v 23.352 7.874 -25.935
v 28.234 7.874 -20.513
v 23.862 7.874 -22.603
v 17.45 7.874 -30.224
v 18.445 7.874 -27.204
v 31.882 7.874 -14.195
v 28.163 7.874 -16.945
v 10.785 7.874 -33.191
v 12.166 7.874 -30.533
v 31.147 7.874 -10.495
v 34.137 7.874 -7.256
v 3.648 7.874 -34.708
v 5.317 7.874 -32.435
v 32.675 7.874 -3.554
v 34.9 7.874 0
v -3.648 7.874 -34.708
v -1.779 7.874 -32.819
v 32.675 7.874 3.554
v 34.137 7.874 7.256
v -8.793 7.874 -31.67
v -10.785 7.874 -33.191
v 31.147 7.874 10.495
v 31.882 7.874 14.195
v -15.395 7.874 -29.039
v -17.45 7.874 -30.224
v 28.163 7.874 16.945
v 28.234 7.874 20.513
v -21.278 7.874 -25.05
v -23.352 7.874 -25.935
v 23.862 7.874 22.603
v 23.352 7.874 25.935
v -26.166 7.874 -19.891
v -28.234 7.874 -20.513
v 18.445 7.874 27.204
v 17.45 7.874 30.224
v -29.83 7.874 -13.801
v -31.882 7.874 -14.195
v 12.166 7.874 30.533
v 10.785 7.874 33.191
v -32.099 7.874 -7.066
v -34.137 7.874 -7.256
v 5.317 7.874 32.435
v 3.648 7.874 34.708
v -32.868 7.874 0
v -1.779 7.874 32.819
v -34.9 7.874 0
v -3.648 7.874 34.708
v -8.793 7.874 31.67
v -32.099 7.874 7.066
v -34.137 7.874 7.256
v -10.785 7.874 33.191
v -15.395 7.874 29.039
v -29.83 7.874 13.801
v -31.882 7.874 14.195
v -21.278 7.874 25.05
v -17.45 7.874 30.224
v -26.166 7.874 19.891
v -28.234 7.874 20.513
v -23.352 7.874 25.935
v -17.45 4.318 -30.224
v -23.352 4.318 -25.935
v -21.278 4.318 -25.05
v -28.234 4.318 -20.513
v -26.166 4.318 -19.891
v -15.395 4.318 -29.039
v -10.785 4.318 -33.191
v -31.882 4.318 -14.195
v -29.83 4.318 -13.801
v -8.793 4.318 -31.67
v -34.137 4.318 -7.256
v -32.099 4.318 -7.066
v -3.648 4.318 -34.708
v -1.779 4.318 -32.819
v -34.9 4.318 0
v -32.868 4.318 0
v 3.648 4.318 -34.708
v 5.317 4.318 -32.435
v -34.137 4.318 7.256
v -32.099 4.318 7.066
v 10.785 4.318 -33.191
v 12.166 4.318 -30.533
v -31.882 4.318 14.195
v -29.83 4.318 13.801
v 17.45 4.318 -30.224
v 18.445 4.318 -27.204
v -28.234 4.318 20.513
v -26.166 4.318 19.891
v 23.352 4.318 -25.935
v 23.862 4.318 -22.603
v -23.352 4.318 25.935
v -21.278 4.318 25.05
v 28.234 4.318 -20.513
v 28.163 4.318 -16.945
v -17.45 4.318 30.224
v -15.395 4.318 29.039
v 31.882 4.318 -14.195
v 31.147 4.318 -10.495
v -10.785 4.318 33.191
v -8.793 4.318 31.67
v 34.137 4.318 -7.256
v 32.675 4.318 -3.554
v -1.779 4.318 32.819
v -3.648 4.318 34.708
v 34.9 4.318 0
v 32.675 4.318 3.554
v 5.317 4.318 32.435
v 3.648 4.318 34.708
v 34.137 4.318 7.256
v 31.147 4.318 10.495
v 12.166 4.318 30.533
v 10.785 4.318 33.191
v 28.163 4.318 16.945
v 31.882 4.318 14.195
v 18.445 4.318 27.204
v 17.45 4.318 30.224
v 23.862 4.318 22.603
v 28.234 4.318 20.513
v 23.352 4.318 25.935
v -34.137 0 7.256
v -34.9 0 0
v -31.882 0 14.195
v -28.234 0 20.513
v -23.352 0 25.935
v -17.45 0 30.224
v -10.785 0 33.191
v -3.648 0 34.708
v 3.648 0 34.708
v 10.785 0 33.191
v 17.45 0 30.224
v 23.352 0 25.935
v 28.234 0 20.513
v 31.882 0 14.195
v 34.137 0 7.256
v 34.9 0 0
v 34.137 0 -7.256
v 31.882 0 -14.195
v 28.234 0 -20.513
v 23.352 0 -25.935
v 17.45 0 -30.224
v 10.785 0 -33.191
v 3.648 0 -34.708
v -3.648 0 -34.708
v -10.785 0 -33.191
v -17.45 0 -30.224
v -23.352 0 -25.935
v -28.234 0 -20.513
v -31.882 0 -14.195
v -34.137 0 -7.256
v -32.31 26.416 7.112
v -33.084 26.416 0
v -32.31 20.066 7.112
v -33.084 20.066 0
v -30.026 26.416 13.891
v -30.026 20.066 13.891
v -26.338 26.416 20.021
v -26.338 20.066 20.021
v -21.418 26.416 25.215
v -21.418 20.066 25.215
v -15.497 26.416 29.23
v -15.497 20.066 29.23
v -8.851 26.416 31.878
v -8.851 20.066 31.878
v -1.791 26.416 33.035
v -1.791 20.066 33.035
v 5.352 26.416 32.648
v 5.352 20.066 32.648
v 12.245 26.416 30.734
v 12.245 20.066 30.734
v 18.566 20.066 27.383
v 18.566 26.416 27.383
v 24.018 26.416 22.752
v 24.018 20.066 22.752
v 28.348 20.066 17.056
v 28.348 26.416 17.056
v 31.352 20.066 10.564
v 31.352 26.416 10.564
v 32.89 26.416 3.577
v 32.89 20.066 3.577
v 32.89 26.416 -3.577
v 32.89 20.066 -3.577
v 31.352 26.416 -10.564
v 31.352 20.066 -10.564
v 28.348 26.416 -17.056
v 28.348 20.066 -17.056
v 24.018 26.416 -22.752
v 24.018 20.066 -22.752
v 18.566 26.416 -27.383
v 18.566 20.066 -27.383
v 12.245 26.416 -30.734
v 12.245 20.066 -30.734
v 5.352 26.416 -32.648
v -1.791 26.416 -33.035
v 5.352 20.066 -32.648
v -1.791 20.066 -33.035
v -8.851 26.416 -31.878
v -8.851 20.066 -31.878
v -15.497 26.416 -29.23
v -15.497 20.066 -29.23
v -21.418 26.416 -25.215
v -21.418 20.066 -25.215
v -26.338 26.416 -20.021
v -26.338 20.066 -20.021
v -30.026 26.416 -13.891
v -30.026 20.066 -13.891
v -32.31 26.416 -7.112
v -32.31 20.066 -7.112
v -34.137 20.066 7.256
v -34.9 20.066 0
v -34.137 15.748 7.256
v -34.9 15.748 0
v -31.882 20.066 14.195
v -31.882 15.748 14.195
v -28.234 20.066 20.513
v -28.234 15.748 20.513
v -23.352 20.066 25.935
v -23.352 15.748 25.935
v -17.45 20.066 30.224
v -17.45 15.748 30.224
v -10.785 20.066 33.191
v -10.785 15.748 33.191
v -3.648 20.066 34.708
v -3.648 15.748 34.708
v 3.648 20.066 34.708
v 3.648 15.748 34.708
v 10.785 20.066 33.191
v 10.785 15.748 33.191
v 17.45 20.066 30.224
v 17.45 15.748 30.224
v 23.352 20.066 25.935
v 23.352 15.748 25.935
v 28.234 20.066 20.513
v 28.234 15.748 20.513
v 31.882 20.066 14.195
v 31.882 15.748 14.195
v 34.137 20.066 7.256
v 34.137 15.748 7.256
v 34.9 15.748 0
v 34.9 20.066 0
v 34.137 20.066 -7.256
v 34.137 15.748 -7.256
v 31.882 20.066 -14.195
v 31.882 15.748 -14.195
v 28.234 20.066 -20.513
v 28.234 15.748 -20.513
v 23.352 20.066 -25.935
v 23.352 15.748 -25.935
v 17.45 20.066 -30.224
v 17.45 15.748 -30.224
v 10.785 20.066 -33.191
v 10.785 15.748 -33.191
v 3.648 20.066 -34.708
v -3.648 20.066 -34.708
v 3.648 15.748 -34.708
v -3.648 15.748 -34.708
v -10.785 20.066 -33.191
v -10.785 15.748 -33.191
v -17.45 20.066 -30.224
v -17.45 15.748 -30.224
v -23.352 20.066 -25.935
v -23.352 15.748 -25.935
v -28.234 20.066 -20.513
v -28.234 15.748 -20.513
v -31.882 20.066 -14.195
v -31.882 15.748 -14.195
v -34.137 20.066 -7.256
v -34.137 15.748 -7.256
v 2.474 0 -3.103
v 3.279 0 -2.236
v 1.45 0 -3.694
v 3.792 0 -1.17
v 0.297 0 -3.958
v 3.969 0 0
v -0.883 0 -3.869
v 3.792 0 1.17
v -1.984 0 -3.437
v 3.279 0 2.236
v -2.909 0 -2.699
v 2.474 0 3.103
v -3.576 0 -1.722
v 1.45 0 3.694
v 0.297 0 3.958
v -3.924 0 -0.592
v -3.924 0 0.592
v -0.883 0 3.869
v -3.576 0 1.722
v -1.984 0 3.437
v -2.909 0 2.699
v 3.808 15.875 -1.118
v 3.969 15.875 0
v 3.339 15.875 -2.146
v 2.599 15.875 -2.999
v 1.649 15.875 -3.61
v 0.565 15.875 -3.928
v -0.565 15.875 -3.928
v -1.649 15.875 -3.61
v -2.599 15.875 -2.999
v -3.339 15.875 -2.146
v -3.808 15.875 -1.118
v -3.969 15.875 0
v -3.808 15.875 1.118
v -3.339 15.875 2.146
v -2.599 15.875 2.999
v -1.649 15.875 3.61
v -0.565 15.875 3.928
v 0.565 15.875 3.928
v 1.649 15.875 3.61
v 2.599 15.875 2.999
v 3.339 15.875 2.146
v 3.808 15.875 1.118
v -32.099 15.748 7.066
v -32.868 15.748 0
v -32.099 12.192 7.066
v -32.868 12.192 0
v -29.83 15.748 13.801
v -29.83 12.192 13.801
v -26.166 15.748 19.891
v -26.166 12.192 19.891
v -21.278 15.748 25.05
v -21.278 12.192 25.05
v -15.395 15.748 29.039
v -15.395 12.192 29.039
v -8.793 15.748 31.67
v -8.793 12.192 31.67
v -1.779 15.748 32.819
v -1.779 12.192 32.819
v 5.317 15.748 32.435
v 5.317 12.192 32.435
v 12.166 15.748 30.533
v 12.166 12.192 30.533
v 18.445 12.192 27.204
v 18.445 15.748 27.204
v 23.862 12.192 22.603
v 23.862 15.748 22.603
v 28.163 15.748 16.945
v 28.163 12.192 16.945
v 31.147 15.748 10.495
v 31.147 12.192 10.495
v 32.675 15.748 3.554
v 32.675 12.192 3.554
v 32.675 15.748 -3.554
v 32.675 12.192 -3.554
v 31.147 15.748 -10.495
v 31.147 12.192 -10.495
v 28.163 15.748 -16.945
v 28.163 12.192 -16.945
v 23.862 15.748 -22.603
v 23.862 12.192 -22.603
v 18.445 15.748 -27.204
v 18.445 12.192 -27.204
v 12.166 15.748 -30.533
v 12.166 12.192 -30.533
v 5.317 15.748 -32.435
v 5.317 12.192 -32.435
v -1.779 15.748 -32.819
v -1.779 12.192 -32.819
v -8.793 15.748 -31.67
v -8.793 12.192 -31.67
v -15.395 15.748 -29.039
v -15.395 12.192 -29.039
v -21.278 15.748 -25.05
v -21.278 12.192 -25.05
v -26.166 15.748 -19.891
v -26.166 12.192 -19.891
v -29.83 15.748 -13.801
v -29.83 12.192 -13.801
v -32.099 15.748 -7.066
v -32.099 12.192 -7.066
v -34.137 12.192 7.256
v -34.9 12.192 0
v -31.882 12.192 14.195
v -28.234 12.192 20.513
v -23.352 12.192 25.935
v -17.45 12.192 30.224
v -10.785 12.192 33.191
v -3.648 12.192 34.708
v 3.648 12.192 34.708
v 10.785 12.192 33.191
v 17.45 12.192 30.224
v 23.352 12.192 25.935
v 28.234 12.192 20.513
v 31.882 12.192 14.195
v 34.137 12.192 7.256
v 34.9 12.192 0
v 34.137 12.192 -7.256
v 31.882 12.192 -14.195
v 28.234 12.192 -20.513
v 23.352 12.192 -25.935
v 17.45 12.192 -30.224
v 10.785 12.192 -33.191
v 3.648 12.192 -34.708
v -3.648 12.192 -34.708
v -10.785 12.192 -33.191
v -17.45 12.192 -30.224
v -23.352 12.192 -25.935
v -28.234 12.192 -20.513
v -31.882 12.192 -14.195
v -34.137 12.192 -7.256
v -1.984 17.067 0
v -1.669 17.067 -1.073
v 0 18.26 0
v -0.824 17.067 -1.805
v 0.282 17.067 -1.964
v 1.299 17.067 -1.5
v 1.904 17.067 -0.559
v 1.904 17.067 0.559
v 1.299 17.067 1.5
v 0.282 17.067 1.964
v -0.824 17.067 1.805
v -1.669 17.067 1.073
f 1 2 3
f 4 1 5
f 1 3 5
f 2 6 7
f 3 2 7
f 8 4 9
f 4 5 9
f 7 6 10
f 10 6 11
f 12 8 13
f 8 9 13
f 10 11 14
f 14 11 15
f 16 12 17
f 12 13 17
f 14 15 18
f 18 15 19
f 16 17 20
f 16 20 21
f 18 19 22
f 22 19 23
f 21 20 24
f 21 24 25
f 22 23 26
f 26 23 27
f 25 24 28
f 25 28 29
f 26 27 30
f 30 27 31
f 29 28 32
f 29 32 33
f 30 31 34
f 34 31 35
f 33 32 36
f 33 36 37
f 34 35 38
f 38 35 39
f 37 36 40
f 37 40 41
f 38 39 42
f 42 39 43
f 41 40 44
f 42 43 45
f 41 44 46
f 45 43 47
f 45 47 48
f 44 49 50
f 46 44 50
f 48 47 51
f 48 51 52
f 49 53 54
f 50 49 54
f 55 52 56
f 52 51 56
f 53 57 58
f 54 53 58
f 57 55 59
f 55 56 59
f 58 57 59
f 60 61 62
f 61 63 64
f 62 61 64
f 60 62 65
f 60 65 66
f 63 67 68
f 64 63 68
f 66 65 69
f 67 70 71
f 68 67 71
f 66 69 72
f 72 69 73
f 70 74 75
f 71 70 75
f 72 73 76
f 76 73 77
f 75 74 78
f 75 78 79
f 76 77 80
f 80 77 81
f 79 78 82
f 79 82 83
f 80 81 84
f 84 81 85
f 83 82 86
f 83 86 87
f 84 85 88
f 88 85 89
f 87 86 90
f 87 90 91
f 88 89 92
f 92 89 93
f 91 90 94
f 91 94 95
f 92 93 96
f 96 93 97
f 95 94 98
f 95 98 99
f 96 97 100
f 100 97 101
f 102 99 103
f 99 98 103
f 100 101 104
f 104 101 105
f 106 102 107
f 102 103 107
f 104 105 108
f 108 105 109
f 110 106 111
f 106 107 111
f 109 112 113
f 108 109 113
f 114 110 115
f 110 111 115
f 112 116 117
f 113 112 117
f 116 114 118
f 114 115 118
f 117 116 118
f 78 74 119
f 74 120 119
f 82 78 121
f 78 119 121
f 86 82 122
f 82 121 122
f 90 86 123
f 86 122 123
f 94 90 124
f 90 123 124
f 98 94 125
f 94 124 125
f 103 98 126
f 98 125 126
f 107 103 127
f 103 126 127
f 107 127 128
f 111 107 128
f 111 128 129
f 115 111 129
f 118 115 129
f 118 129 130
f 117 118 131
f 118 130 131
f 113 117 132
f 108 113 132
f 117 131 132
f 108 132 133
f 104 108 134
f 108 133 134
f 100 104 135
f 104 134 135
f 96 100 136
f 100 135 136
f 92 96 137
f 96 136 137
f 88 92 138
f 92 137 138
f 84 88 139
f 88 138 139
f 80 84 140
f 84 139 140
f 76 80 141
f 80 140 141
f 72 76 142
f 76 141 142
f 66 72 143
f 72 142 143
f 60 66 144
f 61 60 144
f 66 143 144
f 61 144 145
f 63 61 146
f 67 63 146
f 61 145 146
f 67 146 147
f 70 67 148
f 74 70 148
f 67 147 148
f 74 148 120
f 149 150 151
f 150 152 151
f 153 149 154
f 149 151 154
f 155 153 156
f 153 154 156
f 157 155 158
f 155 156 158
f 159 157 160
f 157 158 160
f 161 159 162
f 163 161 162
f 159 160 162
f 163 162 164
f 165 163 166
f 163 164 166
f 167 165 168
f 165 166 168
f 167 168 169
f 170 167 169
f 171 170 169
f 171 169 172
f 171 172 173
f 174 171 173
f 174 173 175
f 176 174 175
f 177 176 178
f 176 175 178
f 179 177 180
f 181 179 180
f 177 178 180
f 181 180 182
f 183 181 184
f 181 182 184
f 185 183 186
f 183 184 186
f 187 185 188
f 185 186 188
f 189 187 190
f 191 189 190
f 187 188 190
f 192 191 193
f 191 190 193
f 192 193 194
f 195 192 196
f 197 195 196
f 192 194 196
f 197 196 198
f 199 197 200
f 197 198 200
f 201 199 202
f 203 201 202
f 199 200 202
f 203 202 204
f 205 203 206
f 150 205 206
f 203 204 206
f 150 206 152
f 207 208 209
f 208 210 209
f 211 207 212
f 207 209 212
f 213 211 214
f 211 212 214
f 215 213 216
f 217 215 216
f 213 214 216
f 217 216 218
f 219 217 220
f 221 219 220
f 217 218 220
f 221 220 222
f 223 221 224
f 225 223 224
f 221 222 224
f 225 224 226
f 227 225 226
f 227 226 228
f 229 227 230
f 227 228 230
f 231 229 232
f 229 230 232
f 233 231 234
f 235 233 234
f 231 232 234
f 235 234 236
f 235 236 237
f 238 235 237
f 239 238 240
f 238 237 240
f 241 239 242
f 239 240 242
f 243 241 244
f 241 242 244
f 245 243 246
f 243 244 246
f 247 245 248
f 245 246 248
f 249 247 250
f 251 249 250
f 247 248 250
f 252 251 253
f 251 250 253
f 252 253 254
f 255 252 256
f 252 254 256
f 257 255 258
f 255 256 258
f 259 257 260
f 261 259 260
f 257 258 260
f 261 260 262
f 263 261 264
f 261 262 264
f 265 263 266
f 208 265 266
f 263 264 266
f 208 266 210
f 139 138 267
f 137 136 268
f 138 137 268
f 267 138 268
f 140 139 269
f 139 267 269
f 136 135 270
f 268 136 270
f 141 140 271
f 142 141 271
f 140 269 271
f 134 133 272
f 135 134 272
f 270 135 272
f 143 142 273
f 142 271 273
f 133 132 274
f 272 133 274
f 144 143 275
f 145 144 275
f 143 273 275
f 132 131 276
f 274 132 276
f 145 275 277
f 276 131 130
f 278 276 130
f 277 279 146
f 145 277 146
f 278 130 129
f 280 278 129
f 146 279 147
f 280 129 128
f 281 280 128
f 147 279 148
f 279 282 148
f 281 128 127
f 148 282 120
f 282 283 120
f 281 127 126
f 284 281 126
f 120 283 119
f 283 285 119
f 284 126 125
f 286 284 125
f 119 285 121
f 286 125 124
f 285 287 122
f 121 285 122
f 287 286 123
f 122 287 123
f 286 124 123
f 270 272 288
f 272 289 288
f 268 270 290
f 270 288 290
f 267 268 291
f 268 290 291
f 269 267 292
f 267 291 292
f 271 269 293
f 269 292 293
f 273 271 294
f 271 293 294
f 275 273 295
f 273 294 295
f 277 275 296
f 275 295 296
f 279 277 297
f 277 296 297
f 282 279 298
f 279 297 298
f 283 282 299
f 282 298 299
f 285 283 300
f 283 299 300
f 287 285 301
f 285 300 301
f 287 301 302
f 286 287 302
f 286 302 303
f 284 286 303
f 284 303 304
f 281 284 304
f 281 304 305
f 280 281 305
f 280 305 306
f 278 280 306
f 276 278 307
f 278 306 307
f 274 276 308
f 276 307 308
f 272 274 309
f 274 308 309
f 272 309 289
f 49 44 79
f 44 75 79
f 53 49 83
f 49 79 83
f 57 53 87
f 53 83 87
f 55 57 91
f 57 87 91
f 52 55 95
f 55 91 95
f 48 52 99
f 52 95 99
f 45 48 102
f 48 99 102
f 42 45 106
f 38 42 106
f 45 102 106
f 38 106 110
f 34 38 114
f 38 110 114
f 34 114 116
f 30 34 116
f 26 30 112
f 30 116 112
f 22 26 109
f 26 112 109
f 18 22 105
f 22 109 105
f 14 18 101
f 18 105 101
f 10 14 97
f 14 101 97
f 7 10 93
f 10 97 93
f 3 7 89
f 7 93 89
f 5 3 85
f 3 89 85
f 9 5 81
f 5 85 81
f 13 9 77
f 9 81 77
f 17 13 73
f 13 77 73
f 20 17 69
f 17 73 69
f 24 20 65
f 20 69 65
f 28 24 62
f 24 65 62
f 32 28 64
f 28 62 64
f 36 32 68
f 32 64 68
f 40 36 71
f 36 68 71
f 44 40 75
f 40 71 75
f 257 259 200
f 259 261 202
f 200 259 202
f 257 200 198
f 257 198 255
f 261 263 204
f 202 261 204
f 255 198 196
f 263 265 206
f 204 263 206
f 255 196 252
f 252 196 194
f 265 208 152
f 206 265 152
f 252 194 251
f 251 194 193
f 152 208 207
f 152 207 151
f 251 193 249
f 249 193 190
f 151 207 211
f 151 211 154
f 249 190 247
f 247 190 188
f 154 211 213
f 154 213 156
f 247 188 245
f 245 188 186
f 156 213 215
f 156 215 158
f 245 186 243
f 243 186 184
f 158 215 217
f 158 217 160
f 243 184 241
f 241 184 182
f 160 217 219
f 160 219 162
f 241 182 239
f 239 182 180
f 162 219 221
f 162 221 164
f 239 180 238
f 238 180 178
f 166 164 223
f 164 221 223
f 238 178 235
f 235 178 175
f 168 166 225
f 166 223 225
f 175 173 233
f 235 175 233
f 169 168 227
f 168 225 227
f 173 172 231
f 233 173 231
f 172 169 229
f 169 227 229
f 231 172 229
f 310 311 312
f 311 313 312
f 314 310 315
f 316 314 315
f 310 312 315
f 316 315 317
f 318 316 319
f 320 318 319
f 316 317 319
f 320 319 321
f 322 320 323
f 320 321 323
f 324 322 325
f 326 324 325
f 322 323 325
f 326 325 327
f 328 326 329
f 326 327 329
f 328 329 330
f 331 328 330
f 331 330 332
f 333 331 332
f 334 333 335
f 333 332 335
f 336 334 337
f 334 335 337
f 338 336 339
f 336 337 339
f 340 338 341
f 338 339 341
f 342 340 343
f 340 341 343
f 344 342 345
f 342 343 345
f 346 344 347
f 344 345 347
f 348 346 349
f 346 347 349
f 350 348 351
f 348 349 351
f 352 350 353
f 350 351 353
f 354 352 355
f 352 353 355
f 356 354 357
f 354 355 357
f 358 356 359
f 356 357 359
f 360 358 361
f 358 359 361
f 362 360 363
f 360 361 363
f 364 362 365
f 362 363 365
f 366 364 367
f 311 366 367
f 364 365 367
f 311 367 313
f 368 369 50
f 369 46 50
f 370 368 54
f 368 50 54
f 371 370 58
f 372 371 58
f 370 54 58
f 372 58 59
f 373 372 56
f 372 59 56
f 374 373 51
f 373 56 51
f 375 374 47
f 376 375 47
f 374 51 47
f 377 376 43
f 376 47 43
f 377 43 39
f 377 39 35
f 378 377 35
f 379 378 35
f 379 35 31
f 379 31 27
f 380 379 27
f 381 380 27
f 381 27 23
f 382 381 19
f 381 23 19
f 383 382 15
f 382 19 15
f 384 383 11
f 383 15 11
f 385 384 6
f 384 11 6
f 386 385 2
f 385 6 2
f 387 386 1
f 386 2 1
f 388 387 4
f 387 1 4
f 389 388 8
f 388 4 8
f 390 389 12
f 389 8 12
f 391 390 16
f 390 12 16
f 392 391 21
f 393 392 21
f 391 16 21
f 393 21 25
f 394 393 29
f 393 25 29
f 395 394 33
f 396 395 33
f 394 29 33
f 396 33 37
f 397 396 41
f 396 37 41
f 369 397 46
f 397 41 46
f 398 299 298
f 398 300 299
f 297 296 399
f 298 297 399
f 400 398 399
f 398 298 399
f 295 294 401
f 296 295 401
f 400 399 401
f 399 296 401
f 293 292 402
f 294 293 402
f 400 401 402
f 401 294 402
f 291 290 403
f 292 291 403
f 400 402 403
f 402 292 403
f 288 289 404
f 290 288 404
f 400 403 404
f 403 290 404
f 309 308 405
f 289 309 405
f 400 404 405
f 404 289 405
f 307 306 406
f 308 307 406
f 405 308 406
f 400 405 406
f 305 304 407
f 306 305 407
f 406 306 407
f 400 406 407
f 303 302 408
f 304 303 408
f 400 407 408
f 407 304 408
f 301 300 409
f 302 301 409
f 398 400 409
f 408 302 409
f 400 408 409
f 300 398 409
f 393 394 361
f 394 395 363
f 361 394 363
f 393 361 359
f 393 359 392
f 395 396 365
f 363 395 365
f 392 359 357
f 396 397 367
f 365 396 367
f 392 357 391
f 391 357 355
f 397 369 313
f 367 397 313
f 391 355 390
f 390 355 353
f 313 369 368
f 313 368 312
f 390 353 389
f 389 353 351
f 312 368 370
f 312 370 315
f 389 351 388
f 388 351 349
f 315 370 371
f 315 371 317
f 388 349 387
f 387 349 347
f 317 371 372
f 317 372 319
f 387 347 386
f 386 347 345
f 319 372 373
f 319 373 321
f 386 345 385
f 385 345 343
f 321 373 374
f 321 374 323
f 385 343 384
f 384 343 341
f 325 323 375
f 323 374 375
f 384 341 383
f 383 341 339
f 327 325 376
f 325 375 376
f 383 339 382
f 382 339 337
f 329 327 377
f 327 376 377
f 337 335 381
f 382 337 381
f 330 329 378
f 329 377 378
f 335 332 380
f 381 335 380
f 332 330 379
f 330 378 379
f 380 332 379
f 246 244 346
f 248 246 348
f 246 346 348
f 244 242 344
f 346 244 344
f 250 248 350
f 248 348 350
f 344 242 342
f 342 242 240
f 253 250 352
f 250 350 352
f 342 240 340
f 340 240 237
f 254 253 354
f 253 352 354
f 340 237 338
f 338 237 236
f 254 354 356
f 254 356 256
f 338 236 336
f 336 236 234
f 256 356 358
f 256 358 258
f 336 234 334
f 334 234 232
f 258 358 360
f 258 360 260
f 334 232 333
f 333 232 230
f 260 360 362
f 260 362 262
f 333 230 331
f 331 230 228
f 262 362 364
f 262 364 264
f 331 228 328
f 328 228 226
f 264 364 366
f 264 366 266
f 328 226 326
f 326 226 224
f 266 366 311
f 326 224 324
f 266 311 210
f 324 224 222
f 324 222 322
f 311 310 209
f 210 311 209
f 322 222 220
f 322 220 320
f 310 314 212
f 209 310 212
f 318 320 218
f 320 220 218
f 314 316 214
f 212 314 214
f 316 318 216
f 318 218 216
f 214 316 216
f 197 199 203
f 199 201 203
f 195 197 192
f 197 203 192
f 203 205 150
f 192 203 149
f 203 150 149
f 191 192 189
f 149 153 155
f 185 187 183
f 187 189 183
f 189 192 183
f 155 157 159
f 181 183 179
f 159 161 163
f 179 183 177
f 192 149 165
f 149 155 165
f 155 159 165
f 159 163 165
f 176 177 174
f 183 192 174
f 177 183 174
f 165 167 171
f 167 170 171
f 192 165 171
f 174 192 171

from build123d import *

# Parameters (mm, degrees)
TAP_DRILL_FOR_3_8_16_TAP1_D     = 7.9375
TAP_DRILL_FOR_3_8_16_TAP1_DEPTH = 15.875
TAP_DRILL_FOR_3_8_16_TAP1_TIP   = 2.384665582


with BuildPart() as part:
    # Sketch8 → Revolve1 (revolve)
    with BuildSketch(Plane.XY):
        Polygon((0, 0), (0, 26.416), (-33.0835, 26.416), (-33.0835, 20.066), (-34.8996, 20.066), (-34.8996, 15.748), (-32.8676, 15.748), (-32.8676, 12.192), (-34.8996, 12.192), (-34.8996, 7.874), (-32.8676, 7.874), (-32.8676, 4.318), (-34.8996, 4.318), (-34.8996, 0), align=None)
    revolve(axis=Axis((0, 0, 0), (0, 1, 0)))

    # Tap Drill for 3/8-16 Tap1
    with Locations(Plane(origin=(0, 0, 0), x_dir=(-1, 0, 0), z_dir=(0, -1, 0))):
        with Locations((0, 0)):
            Hole(TAP_DRILL_FOR_3_8_16_TAP1_D / 2, depth=TAP_DRILL_FOR_3_8_16_TAP1_DEPTH)
            with Locations((0, 0, -(TAP_DRILL_FOR_3_8_16_TAP1_DEPTH + TAP_DRILL_FOR_3_8_16_TAP1_TIP / 2))):  # 118° drill point
                Cone(0, TAP_DRILL_FOR_3_8_16_TAP1_D / 2, TAP_DRILL_FOR_3_8_16_TAP1_TIP, mode=Mode.SUBTRACT)


solid = part.part
